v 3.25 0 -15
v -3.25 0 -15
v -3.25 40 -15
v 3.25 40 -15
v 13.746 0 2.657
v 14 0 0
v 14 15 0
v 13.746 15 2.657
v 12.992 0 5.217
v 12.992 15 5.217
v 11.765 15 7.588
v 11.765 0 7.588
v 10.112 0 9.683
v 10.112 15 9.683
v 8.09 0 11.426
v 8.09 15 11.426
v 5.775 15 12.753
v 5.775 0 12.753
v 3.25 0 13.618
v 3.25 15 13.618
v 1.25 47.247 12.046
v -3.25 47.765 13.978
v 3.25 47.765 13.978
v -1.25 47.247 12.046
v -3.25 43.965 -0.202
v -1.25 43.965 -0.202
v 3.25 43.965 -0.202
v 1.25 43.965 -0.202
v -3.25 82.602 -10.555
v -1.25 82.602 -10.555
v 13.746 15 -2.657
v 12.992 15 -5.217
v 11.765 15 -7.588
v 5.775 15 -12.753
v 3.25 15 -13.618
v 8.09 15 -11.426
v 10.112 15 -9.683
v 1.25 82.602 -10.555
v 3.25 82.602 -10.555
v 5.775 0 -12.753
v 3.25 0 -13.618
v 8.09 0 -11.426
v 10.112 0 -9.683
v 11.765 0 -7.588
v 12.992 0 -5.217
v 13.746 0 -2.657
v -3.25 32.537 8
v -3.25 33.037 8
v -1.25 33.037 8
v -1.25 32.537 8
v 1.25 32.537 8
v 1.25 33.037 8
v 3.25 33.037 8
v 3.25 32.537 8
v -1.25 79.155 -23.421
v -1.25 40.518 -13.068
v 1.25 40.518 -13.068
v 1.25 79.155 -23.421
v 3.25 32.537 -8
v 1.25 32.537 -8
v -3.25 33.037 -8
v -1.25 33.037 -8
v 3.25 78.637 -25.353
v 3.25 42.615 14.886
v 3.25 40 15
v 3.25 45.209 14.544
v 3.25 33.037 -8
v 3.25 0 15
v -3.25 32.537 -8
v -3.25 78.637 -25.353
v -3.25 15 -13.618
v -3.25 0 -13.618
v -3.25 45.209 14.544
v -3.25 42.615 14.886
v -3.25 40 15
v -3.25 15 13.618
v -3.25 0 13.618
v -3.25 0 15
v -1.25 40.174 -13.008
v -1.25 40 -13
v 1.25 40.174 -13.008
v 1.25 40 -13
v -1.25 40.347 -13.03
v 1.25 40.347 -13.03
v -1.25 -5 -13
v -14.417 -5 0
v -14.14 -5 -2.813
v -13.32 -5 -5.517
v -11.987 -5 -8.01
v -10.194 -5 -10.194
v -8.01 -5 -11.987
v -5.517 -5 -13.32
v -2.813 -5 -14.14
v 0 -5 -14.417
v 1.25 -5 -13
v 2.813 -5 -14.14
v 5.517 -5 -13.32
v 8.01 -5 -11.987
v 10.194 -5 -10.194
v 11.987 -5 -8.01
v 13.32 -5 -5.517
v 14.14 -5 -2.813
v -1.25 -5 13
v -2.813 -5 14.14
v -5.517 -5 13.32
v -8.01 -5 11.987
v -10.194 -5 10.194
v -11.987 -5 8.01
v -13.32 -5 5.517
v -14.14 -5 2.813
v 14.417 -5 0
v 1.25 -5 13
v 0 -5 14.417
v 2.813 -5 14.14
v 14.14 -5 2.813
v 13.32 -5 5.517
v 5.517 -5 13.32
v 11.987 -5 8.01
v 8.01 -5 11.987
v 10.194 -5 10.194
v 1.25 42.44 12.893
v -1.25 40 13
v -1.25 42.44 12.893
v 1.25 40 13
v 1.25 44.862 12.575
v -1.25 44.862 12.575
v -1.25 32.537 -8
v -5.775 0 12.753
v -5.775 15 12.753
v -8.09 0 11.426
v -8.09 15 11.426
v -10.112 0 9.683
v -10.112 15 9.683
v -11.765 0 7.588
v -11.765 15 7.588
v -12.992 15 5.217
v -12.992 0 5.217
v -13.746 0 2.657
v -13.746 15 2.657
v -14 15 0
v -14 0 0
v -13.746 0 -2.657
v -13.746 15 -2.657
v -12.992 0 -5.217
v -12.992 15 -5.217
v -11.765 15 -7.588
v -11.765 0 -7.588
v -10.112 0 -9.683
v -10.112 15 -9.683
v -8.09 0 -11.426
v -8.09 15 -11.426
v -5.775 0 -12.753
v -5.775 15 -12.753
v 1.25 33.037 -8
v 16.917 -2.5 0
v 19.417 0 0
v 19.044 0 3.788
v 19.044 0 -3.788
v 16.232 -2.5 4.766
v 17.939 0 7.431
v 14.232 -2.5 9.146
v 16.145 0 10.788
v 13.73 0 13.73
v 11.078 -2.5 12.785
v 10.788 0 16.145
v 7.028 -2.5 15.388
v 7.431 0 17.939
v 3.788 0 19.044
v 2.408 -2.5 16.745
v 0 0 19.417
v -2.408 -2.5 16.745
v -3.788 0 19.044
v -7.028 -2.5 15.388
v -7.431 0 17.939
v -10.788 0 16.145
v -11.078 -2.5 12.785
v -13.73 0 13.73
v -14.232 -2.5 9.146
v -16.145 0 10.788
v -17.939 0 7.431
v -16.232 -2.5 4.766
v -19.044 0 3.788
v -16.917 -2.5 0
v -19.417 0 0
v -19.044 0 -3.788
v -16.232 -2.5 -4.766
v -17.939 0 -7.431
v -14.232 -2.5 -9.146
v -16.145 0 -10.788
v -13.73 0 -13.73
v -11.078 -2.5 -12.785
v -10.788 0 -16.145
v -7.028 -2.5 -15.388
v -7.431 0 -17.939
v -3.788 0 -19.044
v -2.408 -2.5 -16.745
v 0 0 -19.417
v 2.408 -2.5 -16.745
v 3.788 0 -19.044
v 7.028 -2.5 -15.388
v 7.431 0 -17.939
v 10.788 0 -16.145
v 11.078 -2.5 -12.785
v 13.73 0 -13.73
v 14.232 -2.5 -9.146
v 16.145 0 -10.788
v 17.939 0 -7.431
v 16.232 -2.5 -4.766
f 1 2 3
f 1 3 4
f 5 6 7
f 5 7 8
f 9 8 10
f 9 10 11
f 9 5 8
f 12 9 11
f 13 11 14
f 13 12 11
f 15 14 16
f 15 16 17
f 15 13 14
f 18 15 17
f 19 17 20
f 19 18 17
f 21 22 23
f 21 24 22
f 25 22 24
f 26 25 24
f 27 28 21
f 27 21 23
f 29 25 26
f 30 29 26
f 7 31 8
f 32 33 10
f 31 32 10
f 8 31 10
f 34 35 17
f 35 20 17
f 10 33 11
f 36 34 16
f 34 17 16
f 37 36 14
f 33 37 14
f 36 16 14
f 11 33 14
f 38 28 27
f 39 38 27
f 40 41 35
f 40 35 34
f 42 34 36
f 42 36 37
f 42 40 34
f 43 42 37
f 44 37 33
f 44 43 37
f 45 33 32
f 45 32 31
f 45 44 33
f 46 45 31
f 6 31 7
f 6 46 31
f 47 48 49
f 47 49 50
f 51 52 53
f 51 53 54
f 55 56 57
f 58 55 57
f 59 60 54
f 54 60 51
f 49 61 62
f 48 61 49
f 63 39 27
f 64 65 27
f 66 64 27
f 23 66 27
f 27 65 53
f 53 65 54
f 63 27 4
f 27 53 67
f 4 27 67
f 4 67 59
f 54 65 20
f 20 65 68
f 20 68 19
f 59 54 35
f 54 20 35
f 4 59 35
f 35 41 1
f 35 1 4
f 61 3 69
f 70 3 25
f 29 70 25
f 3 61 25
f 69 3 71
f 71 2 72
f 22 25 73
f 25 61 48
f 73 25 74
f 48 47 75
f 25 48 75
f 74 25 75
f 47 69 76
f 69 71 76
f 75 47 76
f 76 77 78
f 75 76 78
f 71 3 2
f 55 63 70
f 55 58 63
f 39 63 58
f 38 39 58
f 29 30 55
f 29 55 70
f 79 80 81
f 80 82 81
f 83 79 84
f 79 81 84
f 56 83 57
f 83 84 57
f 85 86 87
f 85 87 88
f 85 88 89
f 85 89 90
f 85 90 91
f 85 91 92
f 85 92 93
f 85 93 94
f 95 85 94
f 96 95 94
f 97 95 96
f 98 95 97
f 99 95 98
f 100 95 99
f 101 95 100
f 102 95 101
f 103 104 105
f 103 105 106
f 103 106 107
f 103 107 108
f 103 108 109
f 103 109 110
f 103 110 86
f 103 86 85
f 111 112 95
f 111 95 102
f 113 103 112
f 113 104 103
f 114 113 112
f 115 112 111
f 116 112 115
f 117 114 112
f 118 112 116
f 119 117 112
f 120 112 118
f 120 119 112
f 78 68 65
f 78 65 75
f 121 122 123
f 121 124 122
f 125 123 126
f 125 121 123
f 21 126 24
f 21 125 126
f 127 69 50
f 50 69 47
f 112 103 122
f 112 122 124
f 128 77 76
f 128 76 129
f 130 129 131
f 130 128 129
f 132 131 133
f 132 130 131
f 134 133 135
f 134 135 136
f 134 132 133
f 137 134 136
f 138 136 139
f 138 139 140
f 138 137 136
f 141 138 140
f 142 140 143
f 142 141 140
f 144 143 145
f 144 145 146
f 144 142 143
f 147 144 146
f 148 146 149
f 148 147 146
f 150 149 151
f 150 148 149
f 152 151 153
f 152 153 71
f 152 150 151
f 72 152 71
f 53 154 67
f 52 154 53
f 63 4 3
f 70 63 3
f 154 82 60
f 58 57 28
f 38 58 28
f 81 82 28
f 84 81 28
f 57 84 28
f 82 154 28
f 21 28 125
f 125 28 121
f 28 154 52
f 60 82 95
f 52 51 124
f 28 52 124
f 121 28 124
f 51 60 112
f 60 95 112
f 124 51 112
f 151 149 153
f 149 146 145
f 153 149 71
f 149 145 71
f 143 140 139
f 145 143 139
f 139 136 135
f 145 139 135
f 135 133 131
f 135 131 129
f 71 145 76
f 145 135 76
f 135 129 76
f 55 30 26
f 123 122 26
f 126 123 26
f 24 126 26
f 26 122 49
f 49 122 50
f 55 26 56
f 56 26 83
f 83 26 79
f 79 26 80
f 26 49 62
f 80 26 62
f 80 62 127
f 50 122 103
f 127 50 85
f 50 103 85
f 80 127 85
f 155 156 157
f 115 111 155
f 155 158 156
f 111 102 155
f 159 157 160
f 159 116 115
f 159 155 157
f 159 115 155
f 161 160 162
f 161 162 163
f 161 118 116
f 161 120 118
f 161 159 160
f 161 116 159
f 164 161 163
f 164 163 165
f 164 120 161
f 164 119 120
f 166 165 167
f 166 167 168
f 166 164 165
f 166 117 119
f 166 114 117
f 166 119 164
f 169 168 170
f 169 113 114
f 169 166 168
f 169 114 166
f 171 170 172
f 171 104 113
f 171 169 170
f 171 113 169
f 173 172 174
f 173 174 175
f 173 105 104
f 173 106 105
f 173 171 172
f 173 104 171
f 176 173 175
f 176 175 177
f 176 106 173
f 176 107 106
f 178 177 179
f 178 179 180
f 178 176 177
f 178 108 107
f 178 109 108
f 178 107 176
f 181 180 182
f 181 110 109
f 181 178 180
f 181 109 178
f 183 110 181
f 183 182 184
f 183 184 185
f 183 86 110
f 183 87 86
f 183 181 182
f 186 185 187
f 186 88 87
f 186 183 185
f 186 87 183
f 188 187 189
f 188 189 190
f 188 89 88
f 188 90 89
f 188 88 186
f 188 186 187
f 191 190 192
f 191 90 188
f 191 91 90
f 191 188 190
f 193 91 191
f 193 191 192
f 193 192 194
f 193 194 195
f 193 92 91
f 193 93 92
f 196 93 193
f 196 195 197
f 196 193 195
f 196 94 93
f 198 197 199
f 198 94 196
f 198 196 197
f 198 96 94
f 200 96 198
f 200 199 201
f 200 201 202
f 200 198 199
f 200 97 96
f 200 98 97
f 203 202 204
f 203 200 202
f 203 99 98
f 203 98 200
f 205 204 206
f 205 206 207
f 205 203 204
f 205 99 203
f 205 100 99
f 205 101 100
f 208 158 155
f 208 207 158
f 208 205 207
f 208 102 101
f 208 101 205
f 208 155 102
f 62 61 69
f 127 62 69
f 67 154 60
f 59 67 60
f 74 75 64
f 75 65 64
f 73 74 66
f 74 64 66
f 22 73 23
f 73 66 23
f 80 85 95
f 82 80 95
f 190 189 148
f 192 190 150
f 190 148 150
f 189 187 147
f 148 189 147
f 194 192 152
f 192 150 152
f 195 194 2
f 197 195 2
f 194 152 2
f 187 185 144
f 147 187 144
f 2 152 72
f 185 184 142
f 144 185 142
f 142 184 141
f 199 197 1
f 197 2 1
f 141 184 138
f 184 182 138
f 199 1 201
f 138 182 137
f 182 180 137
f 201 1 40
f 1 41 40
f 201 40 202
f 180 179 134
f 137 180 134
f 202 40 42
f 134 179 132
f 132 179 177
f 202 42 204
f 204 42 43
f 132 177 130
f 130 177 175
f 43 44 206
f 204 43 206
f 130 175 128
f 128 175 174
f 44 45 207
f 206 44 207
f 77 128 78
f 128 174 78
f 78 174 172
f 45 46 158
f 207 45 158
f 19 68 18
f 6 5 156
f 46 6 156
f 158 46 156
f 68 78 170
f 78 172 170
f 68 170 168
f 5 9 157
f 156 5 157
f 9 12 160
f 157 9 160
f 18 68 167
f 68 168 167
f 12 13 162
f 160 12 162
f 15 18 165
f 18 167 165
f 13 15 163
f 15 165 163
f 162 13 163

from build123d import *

# Parameters (mm, degrees)
F0_R        = 19.417133546
F0_W        = 2.5
F0_H        = 26
F1_DEPTH    = 5
F2_SIZE     = 4.99999
F3_DEPTH    = 40
F3_FACE_W   = 6.5
F3_FACE_H   = 30
F3_FACE_W_2 = 2.5
F3_FACE_H_2 = 26
F4_ANGLE    = 15
F6_DEPTH    = 40
F7_W        = 0.5
F7_H        = 16
F8_DEPTH    = 25
F9_DEPTH    = 15


# Not quite as in the source:
# - a fillet or chamfer is up to 0.001 mm smaller than in the source, because OpenCascade refuses the exact size


with BuildPart() as f1:
    # F0 (on Front) → F1 (new body)
    with BuildSketch(Plane.XZ):
        Circle(F0_R)
        with BuildLine():
            ThreePointArc((3.25, 13.6175438314), (10.9886304879, 8.6746757864), (14, 0))
            ThreePointArc((14, 0), (10.9886304879, -8.6746757864), (3.25, -13.6175438314))
            Line((3.25, -13.6175438314), (3.25, -15))
            Line((3.25, -15), (-3.25, -15))
            Line((-3.25, -15), (-3.25, -13.6175438314))
            ThreePointArc((-3.25, -13.6175438314), (-14, 0), (-3.25, 13.6175438314))
            Line((-3.25, 13.6175438314), (-3.25, 15))
            Line((-3.25, 15), (3.25, 15))
            Line((3.25, 15), (3.25, 13.6175438314))
        make_face(mode=Mode.SUBTRACT)
        with BuildLine():
            Line((-3.25, -13.6175438314), (-3.25, 13.6175438314))
            ThreePointArc((-3.25, 13.6175438314), (-14, 0), (-3.25, -13.6175438314))
        make_face()
        with BuildLine():
            ThreePointArc((3.25, -13.6175438314), (10.9886304879, -8.6746757864), (14, 0))
            ThreePointArc((14, 0), (10.9886304879, 8.6746757864), (3.25, 13.6175438314))
            Line((3.25, 13.6175438314), (3.25, -13.6175438314))
        make_face()
        with BuildLine():
            Line((3.25, -13.6175438314), (3.25, 13.6175438314))
            ThreePointArc((3.25, 13.6175438314), (0, 14), (-3.25, 13.6175438314))
            Line((-3.25, 13.6175438314), (-3.25, -13.6175438314))
            ThreePointArc((-3.25, -13.6175438314), (0, -14), (3.25, -13.6175438314))
        make_face()
        Rectangle(F0_W, F0_H, mode=Mode.SUBTRACT)
        with BuildLine():
            Line((3.25, -15), (3.25, -13.6175438314))
            ThreePointArc((3.25, -13.6175438314), (0, -14), (-3.25, -13.6175438314))
            Line((-3.25, -13.6175438314), (-3.25, -15))
            Line((-3.25, -15), (3.25, -15))
        make_face()
        with BuildLine():
            ThreePointArc((-3.25, 13.6175438314), (0, 14), (3.25, 13.6175438314))
            Line((3.25, 13.6175438314), (3.25, 15))
            Line((3.25, 15), (-3.25, 15))
            Line((-3.25, 15), (-3.25, 13.6175438314))
        make_face()
    extrude(amount=F1_DEPTH)

    # F2 (size 5 in the source; OpenCascade refuses exactly that, so slightly less here)
    f2_edges = [f1.edges().sort_by_distance(p)[0] for p in [
        (-19.417134, -5, 0),
    ]]
    chamfer(f2_edges, length=F2_SIZE)

    # F0 (on Front) → F3 (join)
    with BuildSketch(Plane.XZ):
        with BuildLine():
            ThreePointArc((-3.25, 13.6175438314), (0, 14), (3.25, 13.6175438314))
            Line((3.25, 13.6175438314), (3.25, 15))
            Line((3.25, 15), (-3.25, 15))
            Line((-3.25, 15), (-3.25, 13.6175438314))
        make_face()
        with BuildLine():
            Line((3.25, -13.6175438314), (3.25, 13.6175438314))
            ThreePointArc((3.25, 13.6175438314), (0, 14), (-3.25, 13.6175438314))
            Line((-3.25, 13.6175438314), (-3.25, -13.6175438314))
            ThreePointArc((-3.25, -13.6175438314), (0, -14), (3.25, -13.6175438314))
        make_face()
        Rectangle(F0_W, F0_H, mode=Mode.SUBTRACT)
        with BuildLine():
            Line((3.25, -15), (3.25, -13.6175438314))
            ThreePointArc((3.25, -13.6175438314), (0, -14), (-3.25, -13.6175438314))
            Line((-3.25, -13.6175438314), (-3.25, -15))
            Line((-3.25, -15), (3.25, -15))
        make_face()
    extrude(amount=-F3_DEPTH)

    # F3_face (on face) → F4 (revolve)
    with BuildSketch(Plane(origin=(0, 40, 0), x_dir=(1, 0, 0), z_dir=(0, 1, 0))):
        Rectangle(F3_FACE_W, F3_FACE_H)
        Rectangle(F3_FACE_W_2, F3_FACE_H_2, mode=Mode.SUBTRACT)
    revolve(axis=Axis((0, 40, -15), (-1, 0, 0)), revolution_arc=F4_ANGLE)

    # F5 (on face) → F6 (join)
    with BuildSketch(Plane(origin=(0, 41.0705080757, -11.0048094716), x_dir=(-1, 0, 0), z_dir=(0, 0.9659258263, -0.2588190451))):
        Polygon((3.25, -4.1361255902), (3.25, 11.1839016899), (1.25, 11.1839016899), (1.25, -2.1361255902), (-1.25, -2.1361255902), (-1.25, 11.1839016899), (-3.25, 11.1839016899), (-3.25, -4.1361255902), align=None)
    extrude(amount=F6_DEPTH)

    # F7 (on face) → F8 (cut)
    with BuildSketch(Plane(origin=(-3.25, 0, 0), x_dir=(0, -1, 0), z_dir=(-1, 0, 0))):
        with Locations((-32.7866710722, 0)):
            Rectangle(F7_W, F7_H)
    extrude(amount=-F8_DEPTH, mode=Mode.SUBTRACT)

    # F0 (on Front) → F9 (join)
    with BuildSketch(Plane.XZ):
        with BuildLine():
            ThreePointArc((3.25, -13.6175438314), (10.9886304879, -8.6746757864), (14, 0))
            ThreePointArc((14, 0), (10.9886304879, 8.6746757864), (3.25, 13.6175438314))
            Line((3.25, 13.6175438314), (3.25, -13.6175438314))
        make_face()
        with BuildLine():
            Line((-3.25, -13.6175438314), (-3.25, 13.6175438314))
            ThreePointArc((-3.25, 13.6175438314), (-14, 0), (-3.25, -13.6175438314))
        make_face()
    extrude(amount=-F9_DEPTH)


solid = f1.part
